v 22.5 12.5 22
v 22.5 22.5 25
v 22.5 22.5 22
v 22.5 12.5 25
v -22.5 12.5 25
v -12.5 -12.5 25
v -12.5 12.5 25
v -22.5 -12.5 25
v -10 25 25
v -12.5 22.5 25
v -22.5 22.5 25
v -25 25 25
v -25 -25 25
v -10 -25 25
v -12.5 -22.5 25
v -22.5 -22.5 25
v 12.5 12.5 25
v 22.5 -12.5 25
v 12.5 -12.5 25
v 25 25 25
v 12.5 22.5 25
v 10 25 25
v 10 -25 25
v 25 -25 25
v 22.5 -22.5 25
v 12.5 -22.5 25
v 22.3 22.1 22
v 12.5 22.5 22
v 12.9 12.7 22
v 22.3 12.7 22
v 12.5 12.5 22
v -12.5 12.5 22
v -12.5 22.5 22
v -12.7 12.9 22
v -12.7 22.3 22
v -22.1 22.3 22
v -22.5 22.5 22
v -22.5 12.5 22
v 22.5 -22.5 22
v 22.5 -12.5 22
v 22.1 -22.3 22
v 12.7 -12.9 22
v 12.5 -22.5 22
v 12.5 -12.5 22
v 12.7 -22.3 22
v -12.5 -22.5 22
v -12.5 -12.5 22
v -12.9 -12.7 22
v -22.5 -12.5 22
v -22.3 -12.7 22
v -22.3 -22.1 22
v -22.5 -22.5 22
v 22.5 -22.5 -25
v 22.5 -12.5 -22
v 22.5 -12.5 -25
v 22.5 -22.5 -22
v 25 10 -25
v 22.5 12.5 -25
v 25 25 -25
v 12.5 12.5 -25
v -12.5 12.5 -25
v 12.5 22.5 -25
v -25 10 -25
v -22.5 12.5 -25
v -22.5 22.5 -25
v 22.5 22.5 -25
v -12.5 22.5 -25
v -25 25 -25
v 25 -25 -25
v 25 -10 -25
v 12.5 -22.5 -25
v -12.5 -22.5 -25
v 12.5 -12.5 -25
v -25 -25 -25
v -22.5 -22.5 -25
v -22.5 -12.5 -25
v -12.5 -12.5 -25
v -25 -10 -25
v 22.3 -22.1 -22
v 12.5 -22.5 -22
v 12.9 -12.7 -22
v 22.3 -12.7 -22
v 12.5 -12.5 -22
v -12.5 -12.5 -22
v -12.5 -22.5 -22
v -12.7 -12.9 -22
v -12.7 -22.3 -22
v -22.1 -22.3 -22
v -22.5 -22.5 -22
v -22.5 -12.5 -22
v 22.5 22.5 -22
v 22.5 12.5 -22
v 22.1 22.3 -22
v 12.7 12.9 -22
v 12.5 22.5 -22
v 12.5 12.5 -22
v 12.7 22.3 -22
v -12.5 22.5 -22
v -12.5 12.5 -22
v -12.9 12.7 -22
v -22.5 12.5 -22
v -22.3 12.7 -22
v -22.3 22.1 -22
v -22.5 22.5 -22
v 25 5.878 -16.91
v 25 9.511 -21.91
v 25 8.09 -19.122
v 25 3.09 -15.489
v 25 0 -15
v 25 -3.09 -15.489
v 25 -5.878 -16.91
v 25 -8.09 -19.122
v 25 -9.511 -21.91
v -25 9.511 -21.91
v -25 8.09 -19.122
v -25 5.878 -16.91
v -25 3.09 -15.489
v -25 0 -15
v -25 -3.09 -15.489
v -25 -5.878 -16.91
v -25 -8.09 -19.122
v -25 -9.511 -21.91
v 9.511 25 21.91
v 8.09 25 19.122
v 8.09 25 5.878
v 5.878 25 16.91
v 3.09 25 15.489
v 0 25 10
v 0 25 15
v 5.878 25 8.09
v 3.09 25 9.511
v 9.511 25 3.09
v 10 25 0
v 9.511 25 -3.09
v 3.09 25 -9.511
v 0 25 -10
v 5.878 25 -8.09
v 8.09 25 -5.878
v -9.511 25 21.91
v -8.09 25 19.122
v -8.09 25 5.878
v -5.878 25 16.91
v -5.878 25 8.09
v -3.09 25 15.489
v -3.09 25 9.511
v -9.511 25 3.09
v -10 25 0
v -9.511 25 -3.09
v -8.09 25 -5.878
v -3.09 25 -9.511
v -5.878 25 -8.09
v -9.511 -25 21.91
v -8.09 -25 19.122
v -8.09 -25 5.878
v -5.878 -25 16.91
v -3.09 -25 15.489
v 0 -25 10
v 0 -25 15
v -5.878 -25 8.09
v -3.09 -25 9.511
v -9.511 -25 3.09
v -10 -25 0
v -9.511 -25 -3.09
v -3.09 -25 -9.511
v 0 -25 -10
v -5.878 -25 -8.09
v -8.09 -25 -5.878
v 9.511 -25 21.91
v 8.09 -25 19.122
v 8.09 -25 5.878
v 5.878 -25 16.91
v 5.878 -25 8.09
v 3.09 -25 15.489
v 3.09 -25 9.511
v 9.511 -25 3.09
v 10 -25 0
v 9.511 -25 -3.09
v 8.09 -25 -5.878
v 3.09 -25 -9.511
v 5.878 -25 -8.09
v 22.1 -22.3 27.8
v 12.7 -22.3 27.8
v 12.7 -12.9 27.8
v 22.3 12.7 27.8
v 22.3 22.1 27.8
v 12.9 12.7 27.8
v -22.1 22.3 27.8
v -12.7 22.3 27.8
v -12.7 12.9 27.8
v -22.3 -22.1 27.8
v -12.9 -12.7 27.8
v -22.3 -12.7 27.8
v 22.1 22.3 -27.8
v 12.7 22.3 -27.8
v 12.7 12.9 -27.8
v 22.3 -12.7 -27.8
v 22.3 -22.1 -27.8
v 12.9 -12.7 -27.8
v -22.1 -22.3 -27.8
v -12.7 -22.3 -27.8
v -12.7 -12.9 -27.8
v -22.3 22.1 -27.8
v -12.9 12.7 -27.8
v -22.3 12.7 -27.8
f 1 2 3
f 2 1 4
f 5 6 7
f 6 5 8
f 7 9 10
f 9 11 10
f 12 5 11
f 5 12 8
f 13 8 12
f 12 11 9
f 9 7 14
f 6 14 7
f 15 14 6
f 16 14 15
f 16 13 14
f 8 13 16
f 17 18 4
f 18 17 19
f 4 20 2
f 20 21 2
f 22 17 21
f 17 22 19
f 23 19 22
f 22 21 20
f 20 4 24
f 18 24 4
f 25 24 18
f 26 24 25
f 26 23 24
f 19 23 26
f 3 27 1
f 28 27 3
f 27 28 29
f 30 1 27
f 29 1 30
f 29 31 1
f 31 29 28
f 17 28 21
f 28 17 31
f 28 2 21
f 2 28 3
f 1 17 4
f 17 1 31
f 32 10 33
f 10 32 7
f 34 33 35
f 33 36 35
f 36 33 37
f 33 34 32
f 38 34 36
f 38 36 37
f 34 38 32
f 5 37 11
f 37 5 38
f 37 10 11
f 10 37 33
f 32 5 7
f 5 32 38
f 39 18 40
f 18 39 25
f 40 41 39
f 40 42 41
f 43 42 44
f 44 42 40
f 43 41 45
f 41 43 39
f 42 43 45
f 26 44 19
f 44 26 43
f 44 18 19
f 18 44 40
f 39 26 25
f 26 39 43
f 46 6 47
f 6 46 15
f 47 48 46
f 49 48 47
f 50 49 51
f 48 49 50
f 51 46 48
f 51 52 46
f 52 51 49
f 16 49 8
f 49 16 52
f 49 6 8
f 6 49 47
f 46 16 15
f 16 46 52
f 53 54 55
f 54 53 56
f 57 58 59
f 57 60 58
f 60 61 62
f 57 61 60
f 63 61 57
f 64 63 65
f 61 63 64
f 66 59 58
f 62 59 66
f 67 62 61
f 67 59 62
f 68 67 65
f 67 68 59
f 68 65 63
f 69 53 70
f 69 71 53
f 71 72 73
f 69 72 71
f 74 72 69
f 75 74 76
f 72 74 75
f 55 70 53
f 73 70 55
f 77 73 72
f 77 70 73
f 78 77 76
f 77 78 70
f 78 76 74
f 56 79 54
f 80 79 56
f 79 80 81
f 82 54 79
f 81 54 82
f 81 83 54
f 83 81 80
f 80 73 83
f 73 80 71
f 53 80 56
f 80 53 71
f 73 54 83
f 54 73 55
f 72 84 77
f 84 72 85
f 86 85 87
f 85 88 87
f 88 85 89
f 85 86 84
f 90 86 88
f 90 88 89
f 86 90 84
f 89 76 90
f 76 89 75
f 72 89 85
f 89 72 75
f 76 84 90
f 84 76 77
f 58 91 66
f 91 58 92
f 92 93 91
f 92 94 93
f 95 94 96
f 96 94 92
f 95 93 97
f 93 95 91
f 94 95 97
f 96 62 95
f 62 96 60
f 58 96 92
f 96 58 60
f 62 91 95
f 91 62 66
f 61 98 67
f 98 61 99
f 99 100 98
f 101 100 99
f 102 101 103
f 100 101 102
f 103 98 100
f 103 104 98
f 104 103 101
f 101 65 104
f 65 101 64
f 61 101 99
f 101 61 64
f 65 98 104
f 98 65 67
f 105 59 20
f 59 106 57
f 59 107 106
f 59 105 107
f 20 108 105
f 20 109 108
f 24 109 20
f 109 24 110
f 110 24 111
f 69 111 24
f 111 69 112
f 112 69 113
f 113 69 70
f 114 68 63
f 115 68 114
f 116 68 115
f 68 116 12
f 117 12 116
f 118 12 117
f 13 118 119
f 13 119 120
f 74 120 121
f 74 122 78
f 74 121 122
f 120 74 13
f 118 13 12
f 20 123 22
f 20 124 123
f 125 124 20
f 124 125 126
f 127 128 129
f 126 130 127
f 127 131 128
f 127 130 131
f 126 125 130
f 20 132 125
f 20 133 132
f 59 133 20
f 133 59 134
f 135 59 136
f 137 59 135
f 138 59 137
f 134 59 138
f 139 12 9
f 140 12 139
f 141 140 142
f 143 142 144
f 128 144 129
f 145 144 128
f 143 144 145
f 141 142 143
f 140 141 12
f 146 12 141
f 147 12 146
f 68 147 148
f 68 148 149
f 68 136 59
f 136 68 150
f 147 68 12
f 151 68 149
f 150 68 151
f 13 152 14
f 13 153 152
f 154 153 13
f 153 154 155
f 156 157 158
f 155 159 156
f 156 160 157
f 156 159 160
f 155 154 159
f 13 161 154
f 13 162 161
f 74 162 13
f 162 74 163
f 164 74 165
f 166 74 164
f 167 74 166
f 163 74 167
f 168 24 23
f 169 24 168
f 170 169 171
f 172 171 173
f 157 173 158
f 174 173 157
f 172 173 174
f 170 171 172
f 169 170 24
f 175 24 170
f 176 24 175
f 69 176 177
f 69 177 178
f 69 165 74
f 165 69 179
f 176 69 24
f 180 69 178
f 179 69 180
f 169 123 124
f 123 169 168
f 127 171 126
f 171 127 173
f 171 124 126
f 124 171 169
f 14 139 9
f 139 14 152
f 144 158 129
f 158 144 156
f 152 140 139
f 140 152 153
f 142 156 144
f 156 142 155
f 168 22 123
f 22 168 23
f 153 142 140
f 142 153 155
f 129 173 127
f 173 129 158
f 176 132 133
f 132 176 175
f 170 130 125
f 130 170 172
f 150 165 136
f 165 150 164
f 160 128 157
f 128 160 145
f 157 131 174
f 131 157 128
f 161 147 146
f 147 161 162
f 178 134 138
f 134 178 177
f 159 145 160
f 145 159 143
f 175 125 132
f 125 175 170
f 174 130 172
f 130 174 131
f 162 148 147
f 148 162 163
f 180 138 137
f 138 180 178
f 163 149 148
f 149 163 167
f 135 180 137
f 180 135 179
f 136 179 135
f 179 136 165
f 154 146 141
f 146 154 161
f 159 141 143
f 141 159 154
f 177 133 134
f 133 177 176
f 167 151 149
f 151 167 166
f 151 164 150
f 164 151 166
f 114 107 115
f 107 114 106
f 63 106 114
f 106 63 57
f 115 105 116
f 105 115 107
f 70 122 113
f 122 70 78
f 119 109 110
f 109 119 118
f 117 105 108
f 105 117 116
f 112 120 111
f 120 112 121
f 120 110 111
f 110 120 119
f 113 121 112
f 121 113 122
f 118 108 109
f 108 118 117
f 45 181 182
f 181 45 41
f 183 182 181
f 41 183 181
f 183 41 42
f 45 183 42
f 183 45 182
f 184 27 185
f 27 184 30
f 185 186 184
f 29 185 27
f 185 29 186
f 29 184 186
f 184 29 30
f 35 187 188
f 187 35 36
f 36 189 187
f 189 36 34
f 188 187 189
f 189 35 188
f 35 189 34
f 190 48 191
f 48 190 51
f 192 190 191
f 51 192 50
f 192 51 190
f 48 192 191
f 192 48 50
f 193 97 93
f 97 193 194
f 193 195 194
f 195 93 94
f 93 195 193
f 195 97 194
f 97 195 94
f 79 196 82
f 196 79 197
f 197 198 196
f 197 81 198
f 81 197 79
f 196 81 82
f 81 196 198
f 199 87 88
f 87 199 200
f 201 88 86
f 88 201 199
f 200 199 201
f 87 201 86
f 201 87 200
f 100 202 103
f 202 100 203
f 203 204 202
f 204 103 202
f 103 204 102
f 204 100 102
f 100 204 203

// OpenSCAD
cube_size = 50;
tube_size = 20;
edge_size = (cube_size-tube_size)/2;
hole_offset = cube_size/2-edge_size/2;

connector_width = 10;
connector_height = 3;

clearance = 0.2;

$fn=20;

difference(){
    cube([cube_size,cube_size,cube_size], true);
    
    #translate([0,0,cube_size/2])
    rotate([90,0,0])    
    cylinder(cube_size+1, d1=tube_size, d2=tube_size, center = true);
    
    #translate([0,0,0])
    rotate([90,0,0])    
    cylinder(cube_size+1, d1=tube_size, d2=tube_size, center = true);
    
    #translate([0,0,-cube_size/2])
    rotate([90,0,90])    
    cylinder(cube_size+1, d1=tube_size, d2=tube_size, center = true);
    
    face_connectors();
    rotate([180,0,0]) face_connectors();
}
face_plugs();
rotate([180,0,0]) face_plugs();
module face_connectors(){
    translate([ hole_offset, hole_offset,cube_size/2-connector_height/2]) connector();
    translate([-hole_offset, hole_offset,cube_size/2-connector_height/2]) connector();
    translate([ hole_offset,-hole_offset,cube_size/2-connector_height/2]) connector();
    translate([-hole_offset,-hole_offset,cube_size/2-connector_height/2]) connector();    
}

module face_plugs(){
     for(r = [0 : 90 : 270]) {
        rotate([0,0,r])
        translate([ hole_offset, -hole_offset,cube_size/2-connector_height/2])
        plug();     
     }
 }

module connector() {
    cube([connector_width, connector_width,connector_height], true);
}


module plug() {
    plug_width = connector_width - clearance*3;
    translate([-connector_width/2+clearance, -connector_width/2+clearance,-connector_height/2])
    linear_extrude(connector_height*2-clearance)
    polygon([[0,0], [0,plug_width],[plug_width,0]]);
}
